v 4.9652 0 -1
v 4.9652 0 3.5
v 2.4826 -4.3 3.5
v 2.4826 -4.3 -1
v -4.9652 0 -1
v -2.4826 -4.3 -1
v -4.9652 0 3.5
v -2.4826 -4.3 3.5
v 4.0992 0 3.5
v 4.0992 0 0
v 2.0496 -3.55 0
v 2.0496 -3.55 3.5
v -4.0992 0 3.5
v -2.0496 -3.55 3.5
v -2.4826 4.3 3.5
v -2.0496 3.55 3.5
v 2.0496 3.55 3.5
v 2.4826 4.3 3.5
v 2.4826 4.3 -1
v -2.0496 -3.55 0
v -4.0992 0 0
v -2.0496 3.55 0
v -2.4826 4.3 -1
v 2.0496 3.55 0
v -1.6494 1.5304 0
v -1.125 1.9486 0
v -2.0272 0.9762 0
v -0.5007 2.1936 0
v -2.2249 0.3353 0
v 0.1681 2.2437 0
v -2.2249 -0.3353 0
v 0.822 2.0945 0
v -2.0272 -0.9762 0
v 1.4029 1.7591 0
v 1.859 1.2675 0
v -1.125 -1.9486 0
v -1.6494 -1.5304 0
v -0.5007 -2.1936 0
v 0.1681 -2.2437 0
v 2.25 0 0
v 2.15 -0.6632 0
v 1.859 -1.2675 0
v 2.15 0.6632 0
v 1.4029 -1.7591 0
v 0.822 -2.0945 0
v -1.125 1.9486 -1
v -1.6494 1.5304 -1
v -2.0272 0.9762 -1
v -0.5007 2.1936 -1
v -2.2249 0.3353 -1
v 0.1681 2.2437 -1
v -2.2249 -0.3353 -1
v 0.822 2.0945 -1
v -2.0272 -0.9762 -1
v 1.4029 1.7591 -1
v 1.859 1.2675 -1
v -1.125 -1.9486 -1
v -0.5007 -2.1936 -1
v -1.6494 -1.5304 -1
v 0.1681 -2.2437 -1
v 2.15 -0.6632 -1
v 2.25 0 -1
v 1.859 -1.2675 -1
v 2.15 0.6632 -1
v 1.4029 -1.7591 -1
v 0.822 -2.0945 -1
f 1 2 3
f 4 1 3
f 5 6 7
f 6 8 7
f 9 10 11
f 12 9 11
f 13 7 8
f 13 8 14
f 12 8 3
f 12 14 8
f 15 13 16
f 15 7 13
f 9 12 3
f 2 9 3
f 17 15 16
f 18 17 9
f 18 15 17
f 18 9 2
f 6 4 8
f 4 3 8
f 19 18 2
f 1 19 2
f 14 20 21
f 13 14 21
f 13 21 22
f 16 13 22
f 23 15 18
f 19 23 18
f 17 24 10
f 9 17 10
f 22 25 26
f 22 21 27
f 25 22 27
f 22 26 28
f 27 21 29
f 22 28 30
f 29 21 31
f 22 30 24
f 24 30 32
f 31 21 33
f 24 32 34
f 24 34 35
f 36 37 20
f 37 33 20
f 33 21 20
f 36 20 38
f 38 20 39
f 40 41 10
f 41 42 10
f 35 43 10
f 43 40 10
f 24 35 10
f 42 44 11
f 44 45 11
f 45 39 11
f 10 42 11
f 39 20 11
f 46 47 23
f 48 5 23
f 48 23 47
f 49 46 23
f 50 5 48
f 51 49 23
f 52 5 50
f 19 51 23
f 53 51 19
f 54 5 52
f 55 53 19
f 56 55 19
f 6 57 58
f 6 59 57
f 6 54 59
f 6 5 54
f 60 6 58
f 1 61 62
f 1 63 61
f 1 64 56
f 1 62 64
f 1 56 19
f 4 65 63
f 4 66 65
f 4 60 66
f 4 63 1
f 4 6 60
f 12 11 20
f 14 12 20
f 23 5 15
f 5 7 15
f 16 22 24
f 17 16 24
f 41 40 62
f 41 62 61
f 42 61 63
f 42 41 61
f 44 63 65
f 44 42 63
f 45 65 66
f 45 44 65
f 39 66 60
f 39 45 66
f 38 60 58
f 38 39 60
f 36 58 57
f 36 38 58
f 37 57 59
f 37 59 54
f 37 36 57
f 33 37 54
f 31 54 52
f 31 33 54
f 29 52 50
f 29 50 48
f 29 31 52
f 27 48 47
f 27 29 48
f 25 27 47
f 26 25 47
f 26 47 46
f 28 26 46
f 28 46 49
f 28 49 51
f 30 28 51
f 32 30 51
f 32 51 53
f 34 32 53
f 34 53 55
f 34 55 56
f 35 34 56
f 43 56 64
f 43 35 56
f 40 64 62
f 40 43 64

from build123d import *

# Parameters (mm, degrees)
F1_DEPTH = 3.5
F2_R     = 2.25
F3_DEPTH = 1


with BuildPart() as f1:
    # F0 (on Top) → F1 (new body)
    with BuildSketch(Plane.XY):
        Polygon((-2.482606, -4.3), (2.482606, -4.3), (4.965212, 0), (2.482606, 4.3), (-2.482606, 4.3), (-4.965212, 0), align=None)
        Polygon((4.099187, 0), (2.049593, -3.55), (-2.049593, -3.55), (-4.099187, 0), (-2.049593, 3.55), (2.049593, 3.55), align=None, mode=Mode.SUBTRACT)
    extrude(amount=F1_DEPTH)

    # F2 (on face) → F3 (join)
    with BuildSketch(Plane(origin=(0, 0, 0), x_dir=(1, 0, 0), z_dir=(0, 0, -1))):
        Polygon((4.965212, 0), (2.482606, 4.3), (-2.482606, 4.3), (-4.965212, 0), (-2.482606, -4.3), (2.482606, -4.3), align=None)
        Circle(F2_R, mode=Mode.SUBTRACT)
    extrude(amount=F3_DEPTH)


solid = f1.part
